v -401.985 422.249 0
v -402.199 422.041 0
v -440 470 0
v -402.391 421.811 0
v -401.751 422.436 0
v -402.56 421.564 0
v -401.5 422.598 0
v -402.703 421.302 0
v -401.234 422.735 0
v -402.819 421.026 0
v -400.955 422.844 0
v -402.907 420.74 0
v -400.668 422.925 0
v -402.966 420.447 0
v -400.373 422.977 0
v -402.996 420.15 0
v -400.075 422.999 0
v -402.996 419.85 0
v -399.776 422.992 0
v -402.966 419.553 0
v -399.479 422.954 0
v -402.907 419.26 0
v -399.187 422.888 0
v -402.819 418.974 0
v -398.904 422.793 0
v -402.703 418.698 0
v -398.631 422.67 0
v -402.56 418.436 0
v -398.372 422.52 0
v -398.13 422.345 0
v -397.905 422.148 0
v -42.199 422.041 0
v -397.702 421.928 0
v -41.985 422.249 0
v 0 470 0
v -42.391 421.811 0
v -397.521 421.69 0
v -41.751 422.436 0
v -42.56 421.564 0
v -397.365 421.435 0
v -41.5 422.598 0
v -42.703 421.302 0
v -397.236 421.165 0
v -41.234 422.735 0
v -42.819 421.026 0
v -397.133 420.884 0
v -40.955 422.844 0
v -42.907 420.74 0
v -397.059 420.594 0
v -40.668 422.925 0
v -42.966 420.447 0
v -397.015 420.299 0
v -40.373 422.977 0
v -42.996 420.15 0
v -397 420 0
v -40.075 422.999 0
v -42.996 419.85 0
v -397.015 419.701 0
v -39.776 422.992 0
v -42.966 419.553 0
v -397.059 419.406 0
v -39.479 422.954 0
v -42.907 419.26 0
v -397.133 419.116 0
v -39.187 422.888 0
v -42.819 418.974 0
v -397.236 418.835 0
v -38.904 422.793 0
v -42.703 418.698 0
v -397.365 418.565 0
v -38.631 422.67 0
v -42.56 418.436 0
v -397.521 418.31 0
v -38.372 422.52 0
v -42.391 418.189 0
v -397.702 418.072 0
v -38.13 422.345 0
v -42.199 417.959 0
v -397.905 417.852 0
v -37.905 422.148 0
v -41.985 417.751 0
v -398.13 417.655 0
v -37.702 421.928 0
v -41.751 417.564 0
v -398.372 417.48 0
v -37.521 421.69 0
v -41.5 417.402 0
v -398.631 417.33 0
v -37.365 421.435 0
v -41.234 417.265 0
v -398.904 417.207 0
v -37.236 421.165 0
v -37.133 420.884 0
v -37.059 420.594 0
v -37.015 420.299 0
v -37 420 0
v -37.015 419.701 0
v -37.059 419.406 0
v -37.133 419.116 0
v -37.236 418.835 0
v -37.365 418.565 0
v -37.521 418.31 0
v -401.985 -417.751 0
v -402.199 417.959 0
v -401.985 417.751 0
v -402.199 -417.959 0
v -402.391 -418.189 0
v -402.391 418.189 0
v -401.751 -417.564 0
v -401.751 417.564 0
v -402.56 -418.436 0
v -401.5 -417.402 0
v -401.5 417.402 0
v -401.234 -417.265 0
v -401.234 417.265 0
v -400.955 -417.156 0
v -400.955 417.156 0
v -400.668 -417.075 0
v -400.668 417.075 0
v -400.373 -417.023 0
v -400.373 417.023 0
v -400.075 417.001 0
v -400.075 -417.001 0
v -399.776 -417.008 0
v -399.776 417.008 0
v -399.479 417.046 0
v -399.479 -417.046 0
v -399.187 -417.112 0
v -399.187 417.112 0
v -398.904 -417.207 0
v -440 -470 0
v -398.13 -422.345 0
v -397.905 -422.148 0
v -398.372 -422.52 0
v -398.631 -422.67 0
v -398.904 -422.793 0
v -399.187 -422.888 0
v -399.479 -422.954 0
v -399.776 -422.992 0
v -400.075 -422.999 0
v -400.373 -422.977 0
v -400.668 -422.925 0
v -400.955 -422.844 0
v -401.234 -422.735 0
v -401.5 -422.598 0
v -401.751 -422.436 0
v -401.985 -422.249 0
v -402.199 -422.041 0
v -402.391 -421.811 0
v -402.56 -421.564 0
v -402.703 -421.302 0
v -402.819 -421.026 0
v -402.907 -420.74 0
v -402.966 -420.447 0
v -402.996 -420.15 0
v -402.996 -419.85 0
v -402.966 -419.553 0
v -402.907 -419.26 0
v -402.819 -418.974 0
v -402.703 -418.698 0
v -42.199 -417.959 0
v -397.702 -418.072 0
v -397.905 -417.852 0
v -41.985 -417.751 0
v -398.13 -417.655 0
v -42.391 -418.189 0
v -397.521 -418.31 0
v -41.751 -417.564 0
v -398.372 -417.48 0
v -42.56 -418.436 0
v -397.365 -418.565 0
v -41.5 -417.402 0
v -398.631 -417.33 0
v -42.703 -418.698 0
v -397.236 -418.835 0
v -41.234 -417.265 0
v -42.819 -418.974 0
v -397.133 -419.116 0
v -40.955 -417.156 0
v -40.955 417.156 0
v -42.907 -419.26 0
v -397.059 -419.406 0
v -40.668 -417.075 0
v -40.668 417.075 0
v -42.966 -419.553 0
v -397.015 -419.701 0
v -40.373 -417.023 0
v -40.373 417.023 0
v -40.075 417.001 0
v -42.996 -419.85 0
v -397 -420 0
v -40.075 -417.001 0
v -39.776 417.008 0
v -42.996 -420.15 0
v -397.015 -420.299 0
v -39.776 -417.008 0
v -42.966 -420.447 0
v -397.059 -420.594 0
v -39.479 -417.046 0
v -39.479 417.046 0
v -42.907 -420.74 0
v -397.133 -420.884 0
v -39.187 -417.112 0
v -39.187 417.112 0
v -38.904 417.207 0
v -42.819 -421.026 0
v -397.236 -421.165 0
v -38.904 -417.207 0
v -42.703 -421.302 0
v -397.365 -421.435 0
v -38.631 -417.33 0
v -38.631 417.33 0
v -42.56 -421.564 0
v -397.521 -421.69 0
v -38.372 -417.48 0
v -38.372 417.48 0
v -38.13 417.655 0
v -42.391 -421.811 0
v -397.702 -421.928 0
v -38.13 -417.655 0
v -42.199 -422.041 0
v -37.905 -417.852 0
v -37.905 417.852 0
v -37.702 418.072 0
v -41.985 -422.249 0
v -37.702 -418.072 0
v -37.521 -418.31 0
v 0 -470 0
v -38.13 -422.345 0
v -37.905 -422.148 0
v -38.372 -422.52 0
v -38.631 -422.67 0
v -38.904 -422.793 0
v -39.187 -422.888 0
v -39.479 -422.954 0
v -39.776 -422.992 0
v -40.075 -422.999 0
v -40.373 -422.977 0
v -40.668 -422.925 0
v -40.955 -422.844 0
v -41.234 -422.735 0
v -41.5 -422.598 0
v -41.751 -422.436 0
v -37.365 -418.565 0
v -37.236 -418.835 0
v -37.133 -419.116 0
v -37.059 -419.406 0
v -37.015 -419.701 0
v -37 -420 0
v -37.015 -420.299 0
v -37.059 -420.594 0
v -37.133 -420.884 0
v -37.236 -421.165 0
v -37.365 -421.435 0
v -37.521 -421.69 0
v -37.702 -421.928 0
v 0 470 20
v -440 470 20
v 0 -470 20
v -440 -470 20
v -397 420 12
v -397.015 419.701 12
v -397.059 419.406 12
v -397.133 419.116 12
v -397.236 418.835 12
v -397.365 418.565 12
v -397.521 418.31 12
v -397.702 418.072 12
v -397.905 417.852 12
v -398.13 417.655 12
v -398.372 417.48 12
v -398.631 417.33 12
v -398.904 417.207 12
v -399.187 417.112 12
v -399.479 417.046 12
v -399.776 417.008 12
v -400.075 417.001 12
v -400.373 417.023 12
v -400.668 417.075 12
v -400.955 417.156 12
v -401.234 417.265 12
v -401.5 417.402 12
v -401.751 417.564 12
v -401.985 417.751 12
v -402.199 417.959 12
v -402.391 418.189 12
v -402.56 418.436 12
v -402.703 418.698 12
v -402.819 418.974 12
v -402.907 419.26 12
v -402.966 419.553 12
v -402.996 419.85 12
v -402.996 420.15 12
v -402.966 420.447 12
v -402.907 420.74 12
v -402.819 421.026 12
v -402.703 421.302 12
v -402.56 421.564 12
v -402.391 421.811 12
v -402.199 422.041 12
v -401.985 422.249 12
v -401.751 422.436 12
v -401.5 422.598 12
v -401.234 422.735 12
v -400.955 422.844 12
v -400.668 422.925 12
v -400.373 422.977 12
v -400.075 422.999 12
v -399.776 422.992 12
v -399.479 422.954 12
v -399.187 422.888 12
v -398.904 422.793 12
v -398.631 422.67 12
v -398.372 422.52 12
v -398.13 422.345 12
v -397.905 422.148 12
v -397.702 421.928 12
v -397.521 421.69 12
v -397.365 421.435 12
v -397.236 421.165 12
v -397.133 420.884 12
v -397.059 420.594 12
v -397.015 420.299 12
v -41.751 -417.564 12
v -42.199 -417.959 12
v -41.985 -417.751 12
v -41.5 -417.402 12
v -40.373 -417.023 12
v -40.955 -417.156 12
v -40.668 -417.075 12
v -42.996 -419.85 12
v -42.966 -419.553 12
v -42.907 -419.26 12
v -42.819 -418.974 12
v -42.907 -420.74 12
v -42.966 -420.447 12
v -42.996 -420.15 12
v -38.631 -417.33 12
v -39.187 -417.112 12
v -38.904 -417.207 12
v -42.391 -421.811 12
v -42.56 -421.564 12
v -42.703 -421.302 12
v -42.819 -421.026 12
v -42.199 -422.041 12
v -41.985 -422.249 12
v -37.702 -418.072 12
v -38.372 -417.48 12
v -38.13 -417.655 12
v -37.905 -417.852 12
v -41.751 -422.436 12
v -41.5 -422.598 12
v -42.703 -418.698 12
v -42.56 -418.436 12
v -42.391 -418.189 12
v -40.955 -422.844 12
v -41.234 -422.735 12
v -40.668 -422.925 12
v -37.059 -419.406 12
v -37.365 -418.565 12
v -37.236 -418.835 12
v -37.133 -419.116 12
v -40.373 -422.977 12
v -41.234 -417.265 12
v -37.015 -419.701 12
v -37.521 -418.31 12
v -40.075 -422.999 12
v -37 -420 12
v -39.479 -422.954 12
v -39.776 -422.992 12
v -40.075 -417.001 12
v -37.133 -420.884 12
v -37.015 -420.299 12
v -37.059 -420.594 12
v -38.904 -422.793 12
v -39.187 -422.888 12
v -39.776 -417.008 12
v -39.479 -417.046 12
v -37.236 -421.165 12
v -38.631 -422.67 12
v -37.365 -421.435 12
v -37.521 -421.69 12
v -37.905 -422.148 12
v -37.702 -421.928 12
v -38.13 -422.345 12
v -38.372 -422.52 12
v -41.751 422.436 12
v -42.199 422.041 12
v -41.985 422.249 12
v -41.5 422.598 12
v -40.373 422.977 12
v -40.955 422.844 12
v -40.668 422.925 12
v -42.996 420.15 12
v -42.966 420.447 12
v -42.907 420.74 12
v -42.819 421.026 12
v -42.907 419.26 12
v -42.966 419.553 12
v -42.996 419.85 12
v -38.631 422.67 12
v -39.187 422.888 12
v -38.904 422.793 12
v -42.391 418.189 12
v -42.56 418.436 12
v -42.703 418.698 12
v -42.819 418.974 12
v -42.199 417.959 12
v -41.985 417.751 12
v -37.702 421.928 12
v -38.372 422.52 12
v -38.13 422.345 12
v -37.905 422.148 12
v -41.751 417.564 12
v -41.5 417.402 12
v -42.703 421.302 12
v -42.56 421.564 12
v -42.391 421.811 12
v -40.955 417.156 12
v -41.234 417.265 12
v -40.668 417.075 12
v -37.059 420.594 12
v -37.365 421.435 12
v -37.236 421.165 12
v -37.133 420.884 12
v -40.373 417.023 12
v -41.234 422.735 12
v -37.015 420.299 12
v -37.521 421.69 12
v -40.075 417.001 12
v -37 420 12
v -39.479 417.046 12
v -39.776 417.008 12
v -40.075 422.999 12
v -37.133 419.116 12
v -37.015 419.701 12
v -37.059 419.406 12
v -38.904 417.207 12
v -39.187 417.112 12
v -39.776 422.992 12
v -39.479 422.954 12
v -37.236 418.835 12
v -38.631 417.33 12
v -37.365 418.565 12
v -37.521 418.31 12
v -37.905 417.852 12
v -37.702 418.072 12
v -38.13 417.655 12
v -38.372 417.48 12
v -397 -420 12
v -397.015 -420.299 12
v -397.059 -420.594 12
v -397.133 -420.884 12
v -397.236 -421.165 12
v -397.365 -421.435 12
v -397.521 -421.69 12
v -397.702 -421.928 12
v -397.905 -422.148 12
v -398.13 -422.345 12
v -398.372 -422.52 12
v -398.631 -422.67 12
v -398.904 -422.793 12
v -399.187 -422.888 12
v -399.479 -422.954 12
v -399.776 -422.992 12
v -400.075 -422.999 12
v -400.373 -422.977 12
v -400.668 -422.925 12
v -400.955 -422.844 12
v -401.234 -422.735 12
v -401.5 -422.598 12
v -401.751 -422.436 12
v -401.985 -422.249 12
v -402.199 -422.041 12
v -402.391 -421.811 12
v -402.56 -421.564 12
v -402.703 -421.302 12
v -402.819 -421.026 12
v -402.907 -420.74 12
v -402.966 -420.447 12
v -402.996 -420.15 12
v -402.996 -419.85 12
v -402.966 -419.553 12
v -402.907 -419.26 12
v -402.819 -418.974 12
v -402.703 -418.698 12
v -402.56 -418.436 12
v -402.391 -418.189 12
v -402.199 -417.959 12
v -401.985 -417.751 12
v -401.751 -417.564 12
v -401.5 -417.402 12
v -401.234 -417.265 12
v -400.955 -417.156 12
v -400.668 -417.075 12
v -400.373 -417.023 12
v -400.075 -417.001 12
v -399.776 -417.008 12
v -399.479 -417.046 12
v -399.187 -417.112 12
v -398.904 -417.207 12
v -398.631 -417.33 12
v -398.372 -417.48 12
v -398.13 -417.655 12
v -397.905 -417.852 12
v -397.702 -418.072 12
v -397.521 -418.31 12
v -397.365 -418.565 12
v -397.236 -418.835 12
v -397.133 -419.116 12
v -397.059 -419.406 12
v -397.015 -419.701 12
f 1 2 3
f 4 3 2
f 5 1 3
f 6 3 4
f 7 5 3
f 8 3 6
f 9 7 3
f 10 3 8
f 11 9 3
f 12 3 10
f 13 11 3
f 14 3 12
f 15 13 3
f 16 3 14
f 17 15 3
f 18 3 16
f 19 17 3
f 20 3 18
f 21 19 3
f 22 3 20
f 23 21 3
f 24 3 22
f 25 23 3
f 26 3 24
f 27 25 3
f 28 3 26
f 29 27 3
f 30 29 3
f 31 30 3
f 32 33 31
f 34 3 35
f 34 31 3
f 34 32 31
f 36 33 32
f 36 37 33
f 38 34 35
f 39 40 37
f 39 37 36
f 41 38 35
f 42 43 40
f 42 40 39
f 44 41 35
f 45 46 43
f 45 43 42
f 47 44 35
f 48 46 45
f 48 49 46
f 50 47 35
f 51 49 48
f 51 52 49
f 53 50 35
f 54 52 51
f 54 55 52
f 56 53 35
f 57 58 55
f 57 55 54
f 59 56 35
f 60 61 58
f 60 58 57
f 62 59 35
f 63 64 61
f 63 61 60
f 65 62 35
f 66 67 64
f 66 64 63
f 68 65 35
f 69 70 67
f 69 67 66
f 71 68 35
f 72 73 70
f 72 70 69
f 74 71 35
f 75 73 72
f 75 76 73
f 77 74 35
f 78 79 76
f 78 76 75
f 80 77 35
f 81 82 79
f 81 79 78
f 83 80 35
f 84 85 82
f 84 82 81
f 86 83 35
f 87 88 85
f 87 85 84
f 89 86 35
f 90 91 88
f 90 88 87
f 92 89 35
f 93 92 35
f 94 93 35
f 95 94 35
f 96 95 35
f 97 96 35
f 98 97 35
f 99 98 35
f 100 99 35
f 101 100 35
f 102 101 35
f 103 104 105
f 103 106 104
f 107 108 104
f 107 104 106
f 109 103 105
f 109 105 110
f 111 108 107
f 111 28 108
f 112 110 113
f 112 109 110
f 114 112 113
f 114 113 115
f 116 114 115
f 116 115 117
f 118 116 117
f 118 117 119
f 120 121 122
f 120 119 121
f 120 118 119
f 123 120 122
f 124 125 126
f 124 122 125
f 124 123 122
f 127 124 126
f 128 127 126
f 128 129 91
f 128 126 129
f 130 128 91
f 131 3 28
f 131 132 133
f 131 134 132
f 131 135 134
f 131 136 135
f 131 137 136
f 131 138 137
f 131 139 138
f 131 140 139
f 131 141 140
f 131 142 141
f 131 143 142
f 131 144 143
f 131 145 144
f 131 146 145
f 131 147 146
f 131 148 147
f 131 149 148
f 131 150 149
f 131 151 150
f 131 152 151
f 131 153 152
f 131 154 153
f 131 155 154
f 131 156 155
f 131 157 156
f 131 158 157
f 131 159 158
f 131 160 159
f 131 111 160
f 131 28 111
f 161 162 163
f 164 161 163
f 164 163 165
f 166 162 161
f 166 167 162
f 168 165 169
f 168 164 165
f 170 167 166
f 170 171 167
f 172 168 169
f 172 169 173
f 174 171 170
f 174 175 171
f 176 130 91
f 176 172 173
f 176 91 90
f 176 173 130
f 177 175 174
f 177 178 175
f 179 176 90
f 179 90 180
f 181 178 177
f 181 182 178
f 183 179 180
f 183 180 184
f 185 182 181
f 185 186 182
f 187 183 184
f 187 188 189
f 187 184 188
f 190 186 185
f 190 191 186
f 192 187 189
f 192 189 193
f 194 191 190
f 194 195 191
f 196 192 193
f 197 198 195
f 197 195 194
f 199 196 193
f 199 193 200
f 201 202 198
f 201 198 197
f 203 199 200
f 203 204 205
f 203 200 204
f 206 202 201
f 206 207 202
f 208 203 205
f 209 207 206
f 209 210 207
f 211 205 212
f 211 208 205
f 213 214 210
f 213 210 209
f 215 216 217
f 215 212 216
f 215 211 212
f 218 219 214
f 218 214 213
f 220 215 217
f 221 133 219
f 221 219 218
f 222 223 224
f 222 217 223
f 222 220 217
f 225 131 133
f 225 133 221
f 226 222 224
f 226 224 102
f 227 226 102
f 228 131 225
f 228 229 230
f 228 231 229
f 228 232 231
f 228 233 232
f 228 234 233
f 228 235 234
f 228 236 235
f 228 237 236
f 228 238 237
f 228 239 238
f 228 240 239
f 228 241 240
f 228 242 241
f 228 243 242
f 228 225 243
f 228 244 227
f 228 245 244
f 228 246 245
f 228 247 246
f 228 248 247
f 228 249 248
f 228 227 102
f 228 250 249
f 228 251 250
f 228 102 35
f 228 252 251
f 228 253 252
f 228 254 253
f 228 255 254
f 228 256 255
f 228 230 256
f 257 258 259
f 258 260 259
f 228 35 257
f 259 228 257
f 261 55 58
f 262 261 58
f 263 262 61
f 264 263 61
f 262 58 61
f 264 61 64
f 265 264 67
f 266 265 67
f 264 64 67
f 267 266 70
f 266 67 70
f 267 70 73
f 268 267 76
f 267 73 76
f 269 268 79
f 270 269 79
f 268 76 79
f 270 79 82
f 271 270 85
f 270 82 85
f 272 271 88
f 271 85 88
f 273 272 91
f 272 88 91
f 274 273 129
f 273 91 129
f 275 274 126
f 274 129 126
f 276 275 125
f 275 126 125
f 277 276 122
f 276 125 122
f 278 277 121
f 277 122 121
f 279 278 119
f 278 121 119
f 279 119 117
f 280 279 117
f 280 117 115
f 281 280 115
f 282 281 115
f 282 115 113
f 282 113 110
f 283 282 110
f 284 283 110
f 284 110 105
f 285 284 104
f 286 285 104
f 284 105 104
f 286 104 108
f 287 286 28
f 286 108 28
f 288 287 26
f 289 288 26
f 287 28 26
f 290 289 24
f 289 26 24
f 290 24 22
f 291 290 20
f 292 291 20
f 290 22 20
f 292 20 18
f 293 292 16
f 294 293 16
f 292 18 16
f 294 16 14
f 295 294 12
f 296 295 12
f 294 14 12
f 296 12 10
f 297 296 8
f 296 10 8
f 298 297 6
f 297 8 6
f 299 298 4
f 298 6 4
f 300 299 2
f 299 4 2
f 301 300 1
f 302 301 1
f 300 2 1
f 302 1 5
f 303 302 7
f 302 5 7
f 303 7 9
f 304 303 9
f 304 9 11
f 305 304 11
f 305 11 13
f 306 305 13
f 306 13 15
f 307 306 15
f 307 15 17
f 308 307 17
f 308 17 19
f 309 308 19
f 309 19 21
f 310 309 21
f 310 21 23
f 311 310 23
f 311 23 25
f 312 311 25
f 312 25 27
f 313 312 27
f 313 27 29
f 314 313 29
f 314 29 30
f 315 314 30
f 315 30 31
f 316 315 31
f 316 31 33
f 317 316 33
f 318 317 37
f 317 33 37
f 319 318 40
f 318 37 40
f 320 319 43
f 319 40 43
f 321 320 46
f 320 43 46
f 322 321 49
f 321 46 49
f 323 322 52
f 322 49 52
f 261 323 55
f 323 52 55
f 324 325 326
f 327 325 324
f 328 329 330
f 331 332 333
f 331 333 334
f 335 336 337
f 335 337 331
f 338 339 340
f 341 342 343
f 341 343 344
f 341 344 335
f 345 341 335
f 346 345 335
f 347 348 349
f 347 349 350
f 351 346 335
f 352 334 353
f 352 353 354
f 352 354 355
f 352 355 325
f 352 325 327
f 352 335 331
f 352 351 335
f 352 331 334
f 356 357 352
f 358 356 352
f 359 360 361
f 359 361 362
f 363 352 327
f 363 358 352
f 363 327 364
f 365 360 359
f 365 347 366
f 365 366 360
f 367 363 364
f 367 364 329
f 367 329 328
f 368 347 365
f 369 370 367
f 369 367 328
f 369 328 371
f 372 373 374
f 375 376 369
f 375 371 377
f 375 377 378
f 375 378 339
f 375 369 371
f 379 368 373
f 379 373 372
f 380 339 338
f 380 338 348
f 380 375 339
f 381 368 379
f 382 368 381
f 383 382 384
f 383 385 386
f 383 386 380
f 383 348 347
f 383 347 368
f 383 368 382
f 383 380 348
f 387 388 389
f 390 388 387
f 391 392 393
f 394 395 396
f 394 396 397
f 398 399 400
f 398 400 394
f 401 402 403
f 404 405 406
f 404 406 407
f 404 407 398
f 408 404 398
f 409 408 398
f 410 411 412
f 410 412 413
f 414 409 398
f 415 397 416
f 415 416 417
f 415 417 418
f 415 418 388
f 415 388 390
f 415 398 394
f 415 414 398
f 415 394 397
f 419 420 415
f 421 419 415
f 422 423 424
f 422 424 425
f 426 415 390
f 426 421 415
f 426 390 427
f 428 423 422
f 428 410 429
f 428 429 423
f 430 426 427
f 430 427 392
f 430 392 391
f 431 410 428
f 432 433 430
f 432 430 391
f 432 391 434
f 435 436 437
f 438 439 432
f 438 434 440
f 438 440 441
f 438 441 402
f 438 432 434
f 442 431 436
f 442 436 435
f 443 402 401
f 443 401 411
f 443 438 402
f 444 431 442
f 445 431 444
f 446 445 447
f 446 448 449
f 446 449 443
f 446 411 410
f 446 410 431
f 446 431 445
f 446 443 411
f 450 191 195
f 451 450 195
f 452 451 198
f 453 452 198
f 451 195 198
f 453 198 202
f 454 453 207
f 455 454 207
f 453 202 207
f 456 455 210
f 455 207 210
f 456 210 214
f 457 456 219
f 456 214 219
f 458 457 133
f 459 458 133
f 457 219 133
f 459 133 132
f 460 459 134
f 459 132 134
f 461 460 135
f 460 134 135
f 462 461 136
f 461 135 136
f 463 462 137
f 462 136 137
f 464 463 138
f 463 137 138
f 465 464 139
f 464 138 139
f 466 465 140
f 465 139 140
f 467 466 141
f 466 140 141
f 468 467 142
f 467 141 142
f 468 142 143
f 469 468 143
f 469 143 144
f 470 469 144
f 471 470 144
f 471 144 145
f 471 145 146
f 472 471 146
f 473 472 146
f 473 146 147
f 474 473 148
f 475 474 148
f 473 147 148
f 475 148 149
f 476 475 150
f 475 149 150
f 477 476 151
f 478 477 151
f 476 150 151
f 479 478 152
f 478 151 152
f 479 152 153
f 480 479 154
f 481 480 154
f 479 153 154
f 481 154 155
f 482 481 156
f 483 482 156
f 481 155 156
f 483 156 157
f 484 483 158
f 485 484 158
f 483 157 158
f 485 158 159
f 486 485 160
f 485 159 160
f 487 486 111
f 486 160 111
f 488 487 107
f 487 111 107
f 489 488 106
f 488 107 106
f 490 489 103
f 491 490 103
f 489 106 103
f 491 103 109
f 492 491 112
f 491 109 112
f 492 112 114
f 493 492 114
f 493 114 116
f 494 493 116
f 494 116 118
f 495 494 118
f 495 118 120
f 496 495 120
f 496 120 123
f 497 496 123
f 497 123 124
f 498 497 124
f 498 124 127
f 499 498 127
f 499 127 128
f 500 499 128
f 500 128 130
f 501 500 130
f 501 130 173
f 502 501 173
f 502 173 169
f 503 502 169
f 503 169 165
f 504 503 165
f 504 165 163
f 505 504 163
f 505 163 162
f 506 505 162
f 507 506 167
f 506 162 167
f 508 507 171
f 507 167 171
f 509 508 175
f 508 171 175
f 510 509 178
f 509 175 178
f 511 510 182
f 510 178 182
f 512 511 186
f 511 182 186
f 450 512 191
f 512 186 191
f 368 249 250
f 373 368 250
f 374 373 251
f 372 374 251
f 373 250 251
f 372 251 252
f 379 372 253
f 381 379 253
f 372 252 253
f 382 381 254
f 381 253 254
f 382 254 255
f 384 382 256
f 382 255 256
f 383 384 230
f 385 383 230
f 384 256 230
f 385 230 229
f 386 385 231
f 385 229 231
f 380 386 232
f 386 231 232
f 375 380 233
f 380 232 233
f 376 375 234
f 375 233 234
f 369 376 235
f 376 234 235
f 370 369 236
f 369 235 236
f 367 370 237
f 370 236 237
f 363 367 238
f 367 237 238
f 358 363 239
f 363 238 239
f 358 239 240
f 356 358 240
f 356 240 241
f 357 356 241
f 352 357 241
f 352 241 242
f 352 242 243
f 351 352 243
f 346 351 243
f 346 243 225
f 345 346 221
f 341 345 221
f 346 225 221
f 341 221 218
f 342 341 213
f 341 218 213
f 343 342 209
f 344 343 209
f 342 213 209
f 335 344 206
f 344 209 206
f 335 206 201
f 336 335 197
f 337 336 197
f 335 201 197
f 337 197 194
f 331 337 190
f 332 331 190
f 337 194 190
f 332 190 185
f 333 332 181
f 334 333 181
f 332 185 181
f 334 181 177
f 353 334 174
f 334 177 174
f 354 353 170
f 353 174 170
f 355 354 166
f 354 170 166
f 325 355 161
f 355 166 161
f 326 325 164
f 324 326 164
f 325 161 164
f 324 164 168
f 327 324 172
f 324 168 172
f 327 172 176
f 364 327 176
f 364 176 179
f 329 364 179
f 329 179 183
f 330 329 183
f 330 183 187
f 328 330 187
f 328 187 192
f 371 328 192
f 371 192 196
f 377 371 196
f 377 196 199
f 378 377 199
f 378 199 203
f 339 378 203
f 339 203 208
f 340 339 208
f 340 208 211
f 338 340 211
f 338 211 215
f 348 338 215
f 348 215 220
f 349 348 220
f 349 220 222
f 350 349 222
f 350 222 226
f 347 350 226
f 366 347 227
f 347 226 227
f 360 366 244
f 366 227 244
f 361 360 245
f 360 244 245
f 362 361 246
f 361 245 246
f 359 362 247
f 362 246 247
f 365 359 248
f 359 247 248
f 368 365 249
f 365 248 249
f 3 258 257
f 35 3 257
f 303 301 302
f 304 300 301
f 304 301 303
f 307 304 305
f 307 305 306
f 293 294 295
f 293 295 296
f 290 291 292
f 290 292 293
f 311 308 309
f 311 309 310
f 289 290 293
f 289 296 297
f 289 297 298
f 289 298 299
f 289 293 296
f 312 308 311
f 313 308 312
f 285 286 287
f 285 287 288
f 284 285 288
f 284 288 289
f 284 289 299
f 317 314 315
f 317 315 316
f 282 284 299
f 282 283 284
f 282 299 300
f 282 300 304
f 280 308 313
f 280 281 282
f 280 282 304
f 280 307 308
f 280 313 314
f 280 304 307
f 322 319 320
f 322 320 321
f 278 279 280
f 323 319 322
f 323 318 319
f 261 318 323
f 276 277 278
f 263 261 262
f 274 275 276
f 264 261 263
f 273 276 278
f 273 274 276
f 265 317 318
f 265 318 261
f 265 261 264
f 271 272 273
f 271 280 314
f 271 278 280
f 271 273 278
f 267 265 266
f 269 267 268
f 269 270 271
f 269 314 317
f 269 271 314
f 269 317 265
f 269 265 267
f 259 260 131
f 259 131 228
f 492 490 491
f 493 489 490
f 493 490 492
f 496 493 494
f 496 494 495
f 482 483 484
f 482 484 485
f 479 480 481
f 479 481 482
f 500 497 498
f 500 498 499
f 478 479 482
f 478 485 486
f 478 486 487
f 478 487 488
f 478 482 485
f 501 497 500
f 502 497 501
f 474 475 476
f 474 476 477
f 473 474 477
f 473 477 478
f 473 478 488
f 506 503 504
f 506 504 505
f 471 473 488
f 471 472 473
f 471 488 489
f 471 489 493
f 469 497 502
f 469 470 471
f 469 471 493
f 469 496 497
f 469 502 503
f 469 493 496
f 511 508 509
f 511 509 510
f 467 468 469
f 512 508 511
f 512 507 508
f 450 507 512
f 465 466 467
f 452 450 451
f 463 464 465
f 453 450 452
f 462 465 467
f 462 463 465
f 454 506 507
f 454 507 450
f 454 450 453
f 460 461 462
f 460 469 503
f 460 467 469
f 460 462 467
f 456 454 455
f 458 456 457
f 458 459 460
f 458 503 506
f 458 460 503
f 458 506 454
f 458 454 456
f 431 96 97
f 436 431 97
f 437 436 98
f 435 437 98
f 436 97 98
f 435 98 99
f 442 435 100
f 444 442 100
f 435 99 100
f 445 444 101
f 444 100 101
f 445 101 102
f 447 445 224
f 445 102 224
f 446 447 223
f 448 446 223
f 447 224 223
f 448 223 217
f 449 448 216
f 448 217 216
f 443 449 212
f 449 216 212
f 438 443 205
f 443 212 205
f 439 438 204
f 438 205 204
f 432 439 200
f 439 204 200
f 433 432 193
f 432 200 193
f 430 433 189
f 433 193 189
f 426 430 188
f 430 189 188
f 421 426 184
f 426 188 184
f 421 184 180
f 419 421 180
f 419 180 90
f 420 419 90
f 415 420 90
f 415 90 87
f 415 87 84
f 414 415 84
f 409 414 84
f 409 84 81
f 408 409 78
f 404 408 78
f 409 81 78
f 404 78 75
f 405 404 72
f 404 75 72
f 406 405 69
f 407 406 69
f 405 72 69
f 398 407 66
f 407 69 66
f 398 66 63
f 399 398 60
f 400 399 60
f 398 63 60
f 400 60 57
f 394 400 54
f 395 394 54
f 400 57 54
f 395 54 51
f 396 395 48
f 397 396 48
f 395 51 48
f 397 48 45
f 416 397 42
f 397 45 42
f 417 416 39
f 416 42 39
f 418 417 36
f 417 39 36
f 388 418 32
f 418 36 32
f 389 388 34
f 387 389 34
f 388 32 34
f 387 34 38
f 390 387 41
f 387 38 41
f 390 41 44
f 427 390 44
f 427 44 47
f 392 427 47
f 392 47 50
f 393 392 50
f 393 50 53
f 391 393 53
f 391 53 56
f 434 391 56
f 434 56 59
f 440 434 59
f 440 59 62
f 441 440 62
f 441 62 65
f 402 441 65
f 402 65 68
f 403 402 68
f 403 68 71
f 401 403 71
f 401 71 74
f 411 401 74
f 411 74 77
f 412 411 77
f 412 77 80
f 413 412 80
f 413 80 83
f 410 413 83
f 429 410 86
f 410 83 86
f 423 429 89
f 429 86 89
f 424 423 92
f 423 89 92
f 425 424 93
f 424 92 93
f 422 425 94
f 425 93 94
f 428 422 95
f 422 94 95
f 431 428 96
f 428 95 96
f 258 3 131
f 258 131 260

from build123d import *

# Parameters (mm, degrees)
F0_W     = 440
F0_H     = 20
F1_DEPTH = 470
F2_R     = 3
F3_DEPTH = 12
F4_R     = 3
F5_DEPTH = 12
F6_R     = 3
F7_DEPTH = 12
F8_R     = 3
F9_DEPTH = 12


with BuildPart() as f1:
    # F0 (on Front) → F1 (new body, symmetric)
    with BuildSketch(Plane.XZ):
        with Locations((-220, 10)):
            Rectangle(F0_W, F0_H)
    extrude(amount=F1_DEPTH, both=True)

    # F2 (on face) → F3 (cut)
    with BuildSketch(Plane(origin=(0, 0, 0), x_dir=(1, 0, 0), z_dir=(0, 0, -1))):
        with Locations((-400, 420)):
            Circle(F2_R)
    extrude(amount=-F3_DEPTH, mode=Mode.SUBTRACT)

    # F4 (on face) → F5 (cut)
    with BuildSketch(Plane(origin=(0, 0, 0), x_dir=(1, 0, 0), z_dir=(0, 0, -1))):
        with Locations((-40, 420)):
            Circle(F4_R)
    extrude(amount=-F5_DEPTH, mode=Mode.SUBTRACT)

    # F6 (on face) → F7 (cut)
    with BuildSketch(Plane(origin=(0, 0, 0), x_dir=(1, 0, 0), z_dir=(0, 0, -1))):
        with Locations((-400, -420)):
            Circle(F6_R)
    extrude(amount=-F7_DEPTH, mode=Mode.SUBTRACT)

    # F8 (on face) → F9 (cut)
    with BuildSketch(Plane(origin=(0, 0, 0), x_dir=(1, 0, 0), z_dir=(0, 0, -1))):
        with Locations((-40, -420)):
            Circle(F8_R)
    extrude(amount=-F9_DEPTH, mode=Mode.SUBTRACT)


solid = f1.part
